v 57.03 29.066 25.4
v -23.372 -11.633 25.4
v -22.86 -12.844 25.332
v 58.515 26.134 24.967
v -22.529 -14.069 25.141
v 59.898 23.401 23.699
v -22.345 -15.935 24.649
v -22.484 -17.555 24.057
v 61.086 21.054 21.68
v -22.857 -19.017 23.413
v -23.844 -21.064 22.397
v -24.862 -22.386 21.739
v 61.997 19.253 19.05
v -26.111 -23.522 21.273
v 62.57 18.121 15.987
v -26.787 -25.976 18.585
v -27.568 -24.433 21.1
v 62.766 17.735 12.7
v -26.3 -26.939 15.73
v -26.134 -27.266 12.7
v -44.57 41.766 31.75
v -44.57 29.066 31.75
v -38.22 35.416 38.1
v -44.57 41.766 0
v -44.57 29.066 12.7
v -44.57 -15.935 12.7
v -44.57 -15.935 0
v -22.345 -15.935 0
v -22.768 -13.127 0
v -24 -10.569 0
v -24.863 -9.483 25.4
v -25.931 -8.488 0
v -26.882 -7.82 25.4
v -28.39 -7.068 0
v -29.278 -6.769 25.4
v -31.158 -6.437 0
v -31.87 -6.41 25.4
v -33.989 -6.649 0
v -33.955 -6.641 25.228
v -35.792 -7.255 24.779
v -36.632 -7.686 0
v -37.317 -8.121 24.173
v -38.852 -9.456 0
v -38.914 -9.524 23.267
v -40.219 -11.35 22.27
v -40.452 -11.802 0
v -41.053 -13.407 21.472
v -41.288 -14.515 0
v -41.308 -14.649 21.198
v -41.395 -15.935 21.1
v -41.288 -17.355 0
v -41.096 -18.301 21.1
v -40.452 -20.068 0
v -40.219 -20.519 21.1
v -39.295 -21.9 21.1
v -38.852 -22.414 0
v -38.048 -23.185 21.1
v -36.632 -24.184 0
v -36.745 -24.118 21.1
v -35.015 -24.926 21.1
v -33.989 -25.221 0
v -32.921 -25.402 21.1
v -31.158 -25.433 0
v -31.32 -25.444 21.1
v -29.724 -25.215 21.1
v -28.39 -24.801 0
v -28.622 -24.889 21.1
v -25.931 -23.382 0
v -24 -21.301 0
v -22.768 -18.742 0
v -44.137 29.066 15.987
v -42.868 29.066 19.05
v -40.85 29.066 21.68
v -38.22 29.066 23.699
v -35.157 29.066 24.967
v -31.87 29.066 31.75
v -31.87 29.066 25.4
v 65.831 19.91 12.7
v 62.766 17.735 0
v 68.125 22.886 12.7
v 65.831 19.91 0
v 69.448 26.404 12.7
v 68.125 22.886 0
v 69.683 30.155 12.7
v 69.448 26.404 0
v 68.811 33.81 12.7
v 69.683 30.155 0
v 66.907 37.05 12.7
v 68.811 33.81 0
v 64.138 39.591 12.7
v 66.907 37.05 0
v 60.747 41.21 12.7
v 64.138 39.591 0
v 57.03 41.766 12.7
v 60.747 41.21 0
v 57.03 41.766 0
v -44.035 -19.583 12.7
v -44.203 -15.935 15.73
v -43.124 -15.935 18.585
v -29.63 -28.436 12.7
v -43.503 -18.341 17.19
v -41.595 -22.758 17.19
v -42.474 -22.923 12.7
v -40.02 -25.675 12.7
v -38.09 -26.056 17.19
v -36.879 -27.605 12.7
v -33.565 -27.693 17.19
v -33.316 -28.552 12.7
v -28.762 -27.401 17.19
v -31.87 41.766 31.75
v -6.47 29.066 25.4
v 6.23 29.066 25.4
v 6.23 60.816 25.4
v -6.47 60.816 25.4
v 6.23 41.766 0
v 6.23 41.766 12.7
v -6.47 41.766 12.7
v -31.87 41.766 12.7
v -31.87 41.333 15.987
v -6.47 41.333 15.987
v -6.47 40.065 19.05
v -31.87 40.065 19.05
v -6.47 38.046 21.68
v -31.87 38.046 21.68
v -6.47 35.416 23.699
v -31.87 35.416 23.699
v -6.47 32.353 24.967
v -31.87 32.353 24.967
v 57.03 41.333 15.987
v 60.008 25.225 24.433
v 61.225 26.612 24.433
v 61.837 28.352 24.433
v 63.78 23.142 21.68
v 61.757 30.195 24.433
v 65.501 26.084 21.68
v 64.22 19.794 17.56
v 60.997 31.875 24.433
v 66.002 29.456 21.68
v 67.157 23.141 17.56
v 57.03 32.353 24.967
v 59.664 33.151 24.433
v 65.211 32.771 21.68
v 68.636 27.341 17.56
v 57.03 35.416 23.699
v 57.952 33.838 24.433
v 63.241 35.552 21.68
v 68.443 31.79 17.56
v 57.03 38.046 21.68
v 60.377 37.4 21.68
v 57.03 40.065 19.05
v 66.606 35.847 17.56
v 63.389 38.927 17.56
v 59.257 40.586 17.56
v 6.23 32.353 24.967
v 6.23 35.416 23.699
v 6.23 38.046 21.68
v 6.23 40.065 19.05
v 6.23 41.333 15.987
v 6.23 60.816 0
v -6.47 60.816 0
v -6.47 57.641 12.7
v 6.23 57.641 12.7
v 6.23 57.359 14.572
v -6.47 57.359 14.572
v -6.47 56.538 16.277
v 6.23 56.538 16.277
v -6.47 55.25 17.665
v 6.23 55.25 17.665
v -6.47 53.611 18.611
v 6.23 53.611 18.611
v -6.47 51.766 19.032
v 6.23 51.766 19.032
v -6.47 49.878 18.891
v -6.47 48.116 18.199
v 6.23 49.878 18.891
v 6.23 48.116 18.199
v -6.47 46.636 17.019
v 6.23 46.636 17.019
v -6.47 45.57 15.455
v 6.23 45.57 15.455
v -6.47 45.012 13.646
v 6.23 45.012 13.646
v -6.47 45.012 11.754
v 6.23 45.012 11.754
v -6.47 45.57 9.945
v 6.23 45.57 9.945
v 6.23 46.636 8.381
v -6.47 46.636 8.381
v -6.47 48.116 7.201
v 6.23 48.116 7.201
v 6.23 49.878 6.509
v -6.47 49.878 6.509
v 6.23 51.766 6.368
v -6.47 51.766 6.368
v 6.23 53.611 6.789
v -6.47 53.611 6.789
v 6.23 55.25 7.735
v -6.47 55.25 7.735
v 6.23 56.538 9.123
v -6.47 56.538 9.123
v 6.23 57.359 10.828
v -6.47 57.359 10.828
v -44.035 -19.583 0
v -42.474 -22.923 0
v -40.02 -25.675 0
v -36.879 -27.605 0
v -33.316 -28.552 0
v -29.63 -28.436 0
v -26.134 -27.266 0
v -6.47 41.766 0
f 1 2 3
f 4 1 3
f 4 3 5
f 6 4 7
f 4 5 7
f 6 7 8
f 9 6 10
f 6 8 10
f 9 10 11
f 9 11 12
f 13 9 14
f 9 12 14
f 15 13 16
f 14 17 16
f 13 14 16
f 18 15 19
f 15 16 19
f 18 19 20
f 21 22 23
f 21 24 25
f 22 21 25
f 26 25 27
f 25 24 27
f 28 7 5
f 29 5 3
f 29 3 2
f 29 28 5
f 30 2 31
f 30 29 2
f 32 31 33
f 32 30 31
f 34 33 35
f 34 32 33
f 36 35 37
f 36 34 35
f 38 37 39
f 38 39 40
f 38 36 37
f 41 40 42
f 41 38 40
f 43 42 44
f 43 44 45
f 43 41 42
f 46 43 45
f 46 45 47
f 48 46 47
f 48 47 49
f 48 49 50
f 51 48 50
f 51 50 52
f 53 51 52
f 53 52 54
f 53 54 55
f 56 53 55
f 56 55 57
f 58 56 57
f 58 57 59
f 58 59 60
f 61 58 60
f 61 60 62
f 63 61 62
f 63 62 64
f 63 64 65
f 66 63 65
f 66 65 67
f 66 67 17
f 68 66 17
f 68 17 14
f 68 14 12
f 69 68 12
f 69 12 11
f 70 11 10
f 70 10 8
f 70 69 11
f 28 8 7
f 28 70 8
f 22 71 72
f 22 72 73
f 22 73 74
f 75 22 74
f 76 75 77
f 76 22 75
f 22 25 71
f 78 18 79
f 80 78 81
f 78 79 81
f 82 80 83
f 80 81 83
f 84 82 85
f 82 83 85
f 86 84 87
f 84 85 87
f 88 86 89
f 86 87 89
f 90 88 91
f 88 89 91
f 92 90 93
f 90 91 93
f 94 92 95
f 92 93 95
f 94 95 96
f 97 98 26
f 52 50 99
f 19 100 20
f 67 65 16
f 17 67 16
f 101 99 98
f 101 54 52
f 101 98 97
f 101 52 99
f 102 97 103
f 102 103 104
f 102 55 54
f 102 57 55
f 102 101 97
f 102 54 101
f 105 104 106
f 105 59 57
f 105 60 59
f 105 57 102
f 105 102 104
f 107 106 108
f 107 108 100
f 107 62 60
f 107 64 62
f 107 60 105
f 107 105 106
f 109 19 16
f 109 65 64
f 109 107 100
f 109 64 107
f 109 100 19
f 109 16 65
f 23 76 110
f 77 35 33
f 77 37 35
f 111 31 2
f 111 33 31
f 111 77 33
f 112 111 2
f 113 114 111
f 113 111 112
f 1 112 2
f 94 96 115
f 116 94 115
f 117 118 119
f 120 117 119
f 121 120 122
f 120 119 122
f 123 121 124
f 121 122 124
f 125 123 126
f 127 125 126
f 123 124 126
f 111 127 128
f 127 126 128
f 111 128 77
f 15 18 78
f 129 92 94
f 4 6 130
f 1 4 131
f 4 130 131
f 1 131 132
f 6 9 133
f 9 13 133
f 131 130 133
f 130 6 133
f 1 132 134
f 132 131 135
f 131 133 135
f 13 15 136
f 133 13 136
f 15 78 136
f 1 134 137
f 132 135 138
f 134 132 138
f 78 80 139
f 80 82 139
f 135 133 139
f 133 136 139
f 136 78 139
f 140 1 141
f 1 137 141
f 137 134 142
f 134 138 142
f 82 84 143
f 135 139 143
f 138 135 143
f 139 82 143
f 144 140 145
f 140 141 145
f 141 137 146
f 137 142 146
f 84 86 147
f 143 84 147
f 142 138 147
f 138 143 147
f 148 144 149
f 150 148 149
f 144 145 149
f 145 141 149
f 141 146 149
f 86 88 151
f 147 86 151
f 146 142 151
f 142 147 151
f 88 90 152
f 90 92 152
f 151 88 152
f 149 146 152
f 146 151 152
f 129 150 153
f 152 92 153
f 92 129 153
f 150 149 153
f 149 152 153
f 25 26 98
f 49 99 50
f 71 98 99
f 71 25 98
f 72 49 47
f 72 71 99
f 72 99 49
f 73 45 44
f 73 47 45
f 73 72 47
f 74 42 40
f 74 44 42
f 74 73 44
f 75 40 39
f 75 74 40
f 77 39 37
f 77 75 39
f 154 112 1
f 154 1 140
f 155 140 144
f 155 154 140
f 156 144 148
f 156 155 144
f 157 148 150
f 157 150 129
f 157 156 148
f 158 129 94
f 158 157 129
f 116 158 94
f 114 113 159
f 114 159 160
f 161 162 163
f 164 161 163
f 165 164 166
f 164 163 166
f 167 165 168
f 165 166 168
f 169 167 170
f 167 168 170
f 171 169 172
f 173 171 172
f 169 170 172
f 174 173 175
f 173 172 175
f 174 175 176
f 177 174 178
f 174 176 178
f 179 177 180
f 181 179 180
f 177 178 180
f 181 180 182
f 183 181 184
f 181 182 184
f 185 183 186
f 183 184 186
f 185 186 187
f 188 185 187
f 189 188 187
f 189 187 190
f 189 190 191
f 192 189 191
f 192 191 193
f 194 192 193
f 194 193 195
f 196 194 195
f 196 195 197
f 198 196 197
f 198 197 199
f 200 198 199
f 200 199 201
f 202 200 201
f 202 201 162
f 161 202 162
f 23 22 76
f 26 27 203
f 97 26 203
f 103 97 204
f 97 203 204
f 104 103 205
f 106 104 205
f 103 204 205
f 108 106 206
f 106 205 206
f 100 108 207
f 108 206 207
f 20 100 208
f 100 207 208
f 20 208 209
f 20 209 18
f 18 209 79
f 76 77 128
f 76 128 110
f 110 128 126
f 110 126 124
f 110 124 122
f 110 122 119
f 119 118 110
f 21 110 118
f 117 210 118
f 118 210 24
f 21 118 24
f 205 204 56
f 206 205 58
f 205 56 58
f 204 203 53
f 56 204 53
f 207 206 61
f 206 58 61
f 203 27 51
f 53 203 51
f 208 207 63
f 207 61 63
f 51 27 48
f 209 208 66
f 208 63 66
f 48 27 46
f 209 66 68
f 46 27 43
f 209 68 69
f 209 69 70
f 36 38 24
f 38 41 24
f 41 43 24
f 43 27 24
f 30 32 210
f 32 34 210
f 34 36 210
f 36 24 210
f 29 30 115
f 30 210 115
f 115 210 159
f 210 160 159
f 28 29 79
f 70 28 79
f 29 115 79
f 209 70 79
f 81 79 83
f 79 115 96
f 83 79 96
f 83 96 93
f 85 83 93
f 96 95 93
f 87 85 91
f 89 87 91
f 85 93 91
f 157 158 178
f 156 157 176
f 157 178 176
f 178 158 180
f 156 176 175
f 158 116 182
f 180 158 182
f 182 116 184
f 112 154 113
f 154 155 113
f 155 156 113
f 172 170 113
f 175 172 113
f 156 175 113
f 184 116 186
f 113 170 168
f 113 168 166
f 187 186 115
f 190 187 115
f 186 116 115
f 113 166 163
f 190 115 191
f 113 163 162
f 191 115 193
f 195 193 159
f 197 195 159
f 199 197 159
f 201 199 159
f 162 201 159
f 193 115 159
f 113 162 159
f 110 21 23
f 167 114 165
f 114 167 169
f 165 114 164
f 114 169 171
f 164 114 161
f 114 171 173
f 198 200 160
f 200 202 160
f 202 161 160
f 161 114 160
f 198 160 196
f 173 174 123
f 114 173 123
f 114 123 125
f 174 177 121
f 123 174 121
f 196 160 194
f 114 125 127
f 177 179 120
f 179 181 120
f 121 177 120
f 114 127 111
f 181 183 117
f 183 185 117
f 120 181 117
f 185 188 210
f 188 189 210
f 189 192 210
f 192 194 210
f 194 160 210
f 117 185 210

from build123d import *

# Parameters (mm, degrees)
F0_W         = 12.7
F0_H         = 12.7
F0_R         = 9.525
F1_DEPTH     = 25.4
F2_DEPTH     = 38.1
F3_SIZE      = 6.34999
F4_T1_DEPTH  = 50.8
F4_T3_DEPTH  = 99.6409143921
F4_T5_DEPTH  = 25.4
F4_T7_DEPTH  = 45.0011313289
F4_T10_ANGLE = 153.1514920802
F4_T12_ANGLE = 116.8485079198
F5_R         = 6.35
F6_DEPTH     = 50.8010001


# Not quite as in the source:
# - a fillet or chamfer that OpenCascade refuses, or shapes differently, is made with other operations: its cross-section is extruded or revolved along the edge and cut away or added
# - a fillet or chamfer is up to 0.001 mm smaller than in the source, because OpenCascade refuses the exact size


with BuildPart() as f1:
    # F0 (on Top) → F1 (new body)
    with BuildSketch(Plane.XY):
        with Locations((-38.2198102176, 35.4162262917)):
            Rectangle(F0_W, F0_H)
        with BuildLine():
            Line((-6.4698102176, 41.7662262917), (-31.8698102176, 41.7662262917))
            Line((-31.8698102176, 41.7662262917), (-31.8698102176, 29.0662262917))
            Line((-31.8698102176, 29.0662262917), (-44.5698102176, 29.0662262917))
            Line((-44.5698102176, 29.0662262917), (-44.5698102176, -15.9349050373))
            ThreePointArc((-44.5698102176, -15.9349050373), (-31.8698102176, -3.2349050373), (-19.1698102176, -15.9349050373))
            ThreePointArc((-19.1698102176, -15.9349050373), (-21.0500621459, -22.5849465157), (-26.1340703224, -27.2658929842))
            Line((-26.1340703224, -27.2658929842), (62.7659296776, 17.7352383447))
            ThreePointArc((62.7659296776, 17.7352383447), (69.3831964392, 32.0146540993), (57.0301897824, 41.7662262917))
            Line((57.0301897824, 41.7662262917), (6.2301897824, 41.7662262917))
            Line((6.2301897824, 41.7662262917), (6.2301897824, 60.8162262917))
            Line((6.2301897824, 60.8162262917), (-6.4698102176, 60.8162262917))
            Line((-6.4698102176, 60.8162262917), (-6.4698102176, 41.7662262917))
        make_face()
        with BuildLine():
            ThreePointArc((-19.1698102176, -15.9349050373), (-31.8698102176, -3.2349050373), (-44.5698102176, -15.9349050373))
            ThreePointArc((-44.5698102176, -15.9349050373), (-38.5198516961, -26.754653109), (-26.1340703224, -27.2658929842))
            ThreePointArc((-26.1340703224, -27.2658929842), (-21.0500621459, -22.5849465157), (-19.1698102176, -15.9349050373))
        make_face()
        with Locations((-31.8698102176, -15.9349050373)):
            Circle(F0_R, mode=Mode.SUBTRACT)
    extrude(amount=F1_DEPTH)

    # F0 (on Top) → F2 (join)
    with BuildSketch(Plane.XY):
        with Locations((-38.2198102176, 35.4162262917)):
            Rectangle(F0_W, F0_H)
    extrude(amount=F2_DEPTH)

    # F3 (size 6.35 in the source; OpenCascade refuses exactly that, so slightly less here)
    f3_edges = [f1.edges().sort_by_distance(p)[0] for p in [
        (-38.21981, 29.066226, 38.1),
        (-44.56981, 35.416226, 38.1),
        (-38.21981, 41.766226, 38.1),
        (-31.86981, 35.416226, 38.1),
    ]]
    chamfer(f3_edges, length=F3_SIZE)

    # F4: fillet of radius 12.7 on 6 edges, made by hand

    # F4_s2 → F4_t1 (cut)
    with BuildSketch(Plane.YZ.offset(6.2301897824)):
        with BuildLine():
            ThreePointArc((29.0662262917, 25.4), (38.0464824127, 21.6802561211), (41.7662262917, 12.7))
            Line((41.7662262917, 12.7), (42.0202262917, 12.7))
            Line((42.0202262917, 12.7), (42.0202262917, 25.654))
            Line((42.0202262917, 25.654), (29.0662262917, 25.654))
            Line((29.0662262917, 25.654), (29.0662262917, 25.4))
        make_face()
    extrude(amount=F4_T1_DEPTH, mode=Mode.SUBTRACT)

    # F4_s4 → F4_t3 (cut)
    with BuildSketch(Plane(origin=(-31.7901974435, -16.0921805414, 0), x_dir=(0, 0, 1), z_dir=(0.8922037754, 0.4516330626, 0))):
        with BuildLine():
            ThreePointArc((25.4, -0.1762775595), (21.6802561211, 8.8039785616), (12.7, 12.5237224405))
            Line((12.7, 12.5237224405), (12.7, 12.7777224405))
            Line((12.7, 12.7777224405), (25.654, 12.7777224405))
            Line((25.654, 12.7777224405), (25.654, -0.1762775595))
            Line((25.654, -0.1762775595), (25.4, -0.1762775595))
        make_face()
    extrude(amount=F4_T3_DEPTH, mode=Mode.SUBTRACT)

    # F4_s6 → F4_t5 (cut)
    with BuildSketch(Plane.YZ.offset(-31.8698102176)):
        with BuildLine():
            ThreePointArc((41.7662262917, 12.7), (38.0464824127, 21.6802561211), (29.0662262917, 25.4))
            Line((29.0662262917, 25.4), (29.0662262917, 25.654))
            Line((29.0662262917, 25.654), (42.0202262917, 25.654))
            Line((42.0202262917, 25.654), (42.0202262917, 12.7))
            Line((42.0202262917, 12.7), (41.7662262917, 12.7))
        make_face()
    extrude(amount=F4_T5_DEPTH, mode=Mode.SUBTRACT)

    # F4_s8 → F4_t7 (cut)
    with BuildSketch(Plane.XZ.offset(-29.0662262917)):
        with BuildLine():
            ThreePointArc((-44.5698102176, 12.7), (-40.8500663387, 21.6802561211), (-31.8698102176, 25.4))
            Line((-31.8698102176, 25.4), (-31.8698102176, 25.654))
            Line((-31.8698102176, 25.654), (-44.8238102176, 25.654))
            Line((-44.8238102176, 25.654), (-44.8238102176, 12.7))
            Line((-44.8238102176, 12.7), (-44.5698102176, 12.7))
        make_face()
    extrude(amount=F4_T7_DEPTH, mode=Mode.SUBTRACT)

    # F4_s9 → F4_t10 (revolve, cut)
    with BuildSketch(Plane(origin=(57.1098025565, 28.9089507875, 0), x_dir=(0, 0, 1), z_dir=(-0.8922037754, -0.4516330626, 0))):
        with BuildLine():
            ThreePointArc((25.4, 0.1762775595), (21.6802561211, -8.8039785616), (12.7, -12.5237224405))
            Line((12.7, -12.5237224405), (12.7, -12.7777224405))
            Line((12.7, -12.7777224405), (25.654, -12.7777224405))
            Line((25.654, -12.7777224405), (25.654, 0.1762775595))
            Line((25.654, 0.1762775595), (25.4, 0.1762775595))
        make_face()
    revolve(axis=Axis((57.0301897824, 29.0662262917, 25.4), (0, 0, 1)), revolution_arc=F4_T10_ANGLE, mode=Mode.SUBTRACT)

    # F4_s11 → F4_t12 (revolve, cut)
    with BuildSketch(Plane.XZ.offset(15.9349050373)):
        with BuildLine():
            ThreePointArc((-44.5698102176, 12.7), (-40.8500663387, 21.6802561211), (-31.8698102176, 25.4))
            Line((-31.8698102176, 25.4), (-31.8698102176, 25.654))
            Line((-31.8698102176, 25.654), (-44.8238102176, 25.654))
            Line((-44.8238102176, 25.654), (-44.8238102176, 12.7))
            Line((-44.8238102176, 12.7), (-44.5698102176, 12.7))
        make_face()
    revolve(axis=Axis((-31.8698102176, -15.9349050373, 25.4), (0, 0, 1)), revolution_arc=F4_T12_ANGLE, mode=Mode.SUBTRACT)

    # F5 (on face) → F6 (cut, through all)
    with BuildSketch(Plane.YZ.offset(6.2301897824)):
        with Locations((51.2912262917, 12.7)):
            Circle(F5_R)
    extrude(amount=-F6_DEPTH, mode=Mode.SUBTRACT)


solid = f1.part
